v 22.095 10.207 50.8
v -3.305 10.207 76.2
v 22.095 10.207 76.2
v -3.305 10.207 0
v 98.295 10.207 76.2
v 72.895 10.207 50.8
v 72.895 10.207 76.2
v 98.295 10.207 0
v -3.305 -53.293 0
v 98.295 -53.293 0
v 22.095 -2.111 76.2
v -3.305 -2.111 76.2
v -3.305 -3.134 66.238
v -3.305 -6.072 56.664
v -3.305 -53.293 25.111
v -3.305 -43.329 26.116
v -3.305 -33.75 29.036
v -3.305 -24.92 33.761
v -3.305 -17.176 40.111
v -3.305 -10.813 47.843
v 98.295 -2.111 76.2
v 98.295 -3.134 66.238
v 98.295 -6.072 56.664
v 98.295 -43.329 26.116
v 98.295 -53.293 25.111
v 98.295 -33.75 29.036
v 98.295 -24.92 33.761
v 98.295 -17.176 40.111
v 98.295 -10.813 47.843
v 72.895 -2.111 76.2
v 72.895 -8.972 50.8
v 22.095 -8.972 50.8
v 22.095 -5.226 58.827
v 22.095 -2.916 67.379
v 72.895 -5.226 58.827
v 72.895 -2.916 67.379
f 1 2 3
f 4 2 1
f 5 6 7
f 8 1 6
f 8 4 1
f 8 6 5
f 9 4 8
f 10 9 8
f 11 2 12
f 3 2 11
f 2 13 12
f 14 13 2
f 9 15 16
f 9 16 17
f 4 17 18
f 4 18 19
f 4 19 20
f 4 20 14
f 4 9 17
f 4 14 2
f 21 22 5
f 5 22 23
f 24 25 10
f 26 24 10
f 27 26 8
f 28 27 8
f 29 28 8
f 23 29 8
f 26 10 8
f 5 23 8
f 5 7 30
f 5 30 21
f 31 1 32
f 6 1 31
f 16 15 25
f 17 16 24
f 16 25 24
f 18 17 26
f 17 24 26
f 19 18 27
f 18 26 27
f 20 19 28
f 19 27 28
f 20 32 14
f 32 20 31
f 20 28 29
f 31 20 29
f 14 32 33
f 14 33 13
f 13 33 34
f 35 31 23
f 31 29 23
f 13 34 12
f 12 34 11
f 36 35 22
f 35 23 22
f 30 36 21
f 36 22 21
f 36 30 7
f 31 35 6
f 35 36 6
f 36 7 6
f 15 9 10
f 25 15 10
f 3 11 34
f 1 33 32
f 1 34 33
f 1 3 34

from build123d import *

# Parameters (mm, degrees)
F0_W     = 101.6
F0_H     = 63.5
F1_DEPTH = 25.4
F2_DEPTH = 50.8
F4_R     = 51.3264150983
F5_DEPTH = 117.602
F6_W     = 50.8
F6_H     = 12.3184835084
F7_DEPTH = 25.4
F8_DEPTH = 25.4


with BuildPart() as f1:
    # F0 (on Top) → F1 (new body)
    with BuildSketch(Plane.XY):
        with Locations((47.4951000333, -21.5426209271)):
            Rectangle(F0_W, F0_H)
    extrude(amount=F1_DEPTH)

    # F2 (add): a face of the model
    f2_faces = [f1.faces().sort_by_distance(p)[0] for p in [
        (47.4951000333, -21.5426209271, 25.4),
    ]]
    extrude(f2_faces, amount=F2_DEPTH)

    # F4 (on face) → F5 (cut)
    with BuildSketch(Plane.YZ.offset(98.2951000333)):
        with Locations((-53.4369722009, 76.4370337129)):
            Circle(F4_R)
    extrude(amount=-F5_DEPTH, mode=Mode.SUBTRACT)

    # F6 (on face) → F7 (cut)
    with BuildSketch(Plane.XY.offset(76.2)):
        with Locations((47.4951000333, 4.0481373187)):
            Rectangle(F6_W, F6_H)
    extrude(amount=-F7_DEPTH, mode=Mode.SUBTRACT)

    # F8 (cut): a face of the model
    f8_faces = [f1.faces().sort_by_distance(p)[0] for p in [
        (47.4951000333, -2.1111044355, 63.5),
    ]]
    extrude(f8_faces, amount=-F8_DEPTH, mode=Mode.SUBTRACT)


solid = f1.part
